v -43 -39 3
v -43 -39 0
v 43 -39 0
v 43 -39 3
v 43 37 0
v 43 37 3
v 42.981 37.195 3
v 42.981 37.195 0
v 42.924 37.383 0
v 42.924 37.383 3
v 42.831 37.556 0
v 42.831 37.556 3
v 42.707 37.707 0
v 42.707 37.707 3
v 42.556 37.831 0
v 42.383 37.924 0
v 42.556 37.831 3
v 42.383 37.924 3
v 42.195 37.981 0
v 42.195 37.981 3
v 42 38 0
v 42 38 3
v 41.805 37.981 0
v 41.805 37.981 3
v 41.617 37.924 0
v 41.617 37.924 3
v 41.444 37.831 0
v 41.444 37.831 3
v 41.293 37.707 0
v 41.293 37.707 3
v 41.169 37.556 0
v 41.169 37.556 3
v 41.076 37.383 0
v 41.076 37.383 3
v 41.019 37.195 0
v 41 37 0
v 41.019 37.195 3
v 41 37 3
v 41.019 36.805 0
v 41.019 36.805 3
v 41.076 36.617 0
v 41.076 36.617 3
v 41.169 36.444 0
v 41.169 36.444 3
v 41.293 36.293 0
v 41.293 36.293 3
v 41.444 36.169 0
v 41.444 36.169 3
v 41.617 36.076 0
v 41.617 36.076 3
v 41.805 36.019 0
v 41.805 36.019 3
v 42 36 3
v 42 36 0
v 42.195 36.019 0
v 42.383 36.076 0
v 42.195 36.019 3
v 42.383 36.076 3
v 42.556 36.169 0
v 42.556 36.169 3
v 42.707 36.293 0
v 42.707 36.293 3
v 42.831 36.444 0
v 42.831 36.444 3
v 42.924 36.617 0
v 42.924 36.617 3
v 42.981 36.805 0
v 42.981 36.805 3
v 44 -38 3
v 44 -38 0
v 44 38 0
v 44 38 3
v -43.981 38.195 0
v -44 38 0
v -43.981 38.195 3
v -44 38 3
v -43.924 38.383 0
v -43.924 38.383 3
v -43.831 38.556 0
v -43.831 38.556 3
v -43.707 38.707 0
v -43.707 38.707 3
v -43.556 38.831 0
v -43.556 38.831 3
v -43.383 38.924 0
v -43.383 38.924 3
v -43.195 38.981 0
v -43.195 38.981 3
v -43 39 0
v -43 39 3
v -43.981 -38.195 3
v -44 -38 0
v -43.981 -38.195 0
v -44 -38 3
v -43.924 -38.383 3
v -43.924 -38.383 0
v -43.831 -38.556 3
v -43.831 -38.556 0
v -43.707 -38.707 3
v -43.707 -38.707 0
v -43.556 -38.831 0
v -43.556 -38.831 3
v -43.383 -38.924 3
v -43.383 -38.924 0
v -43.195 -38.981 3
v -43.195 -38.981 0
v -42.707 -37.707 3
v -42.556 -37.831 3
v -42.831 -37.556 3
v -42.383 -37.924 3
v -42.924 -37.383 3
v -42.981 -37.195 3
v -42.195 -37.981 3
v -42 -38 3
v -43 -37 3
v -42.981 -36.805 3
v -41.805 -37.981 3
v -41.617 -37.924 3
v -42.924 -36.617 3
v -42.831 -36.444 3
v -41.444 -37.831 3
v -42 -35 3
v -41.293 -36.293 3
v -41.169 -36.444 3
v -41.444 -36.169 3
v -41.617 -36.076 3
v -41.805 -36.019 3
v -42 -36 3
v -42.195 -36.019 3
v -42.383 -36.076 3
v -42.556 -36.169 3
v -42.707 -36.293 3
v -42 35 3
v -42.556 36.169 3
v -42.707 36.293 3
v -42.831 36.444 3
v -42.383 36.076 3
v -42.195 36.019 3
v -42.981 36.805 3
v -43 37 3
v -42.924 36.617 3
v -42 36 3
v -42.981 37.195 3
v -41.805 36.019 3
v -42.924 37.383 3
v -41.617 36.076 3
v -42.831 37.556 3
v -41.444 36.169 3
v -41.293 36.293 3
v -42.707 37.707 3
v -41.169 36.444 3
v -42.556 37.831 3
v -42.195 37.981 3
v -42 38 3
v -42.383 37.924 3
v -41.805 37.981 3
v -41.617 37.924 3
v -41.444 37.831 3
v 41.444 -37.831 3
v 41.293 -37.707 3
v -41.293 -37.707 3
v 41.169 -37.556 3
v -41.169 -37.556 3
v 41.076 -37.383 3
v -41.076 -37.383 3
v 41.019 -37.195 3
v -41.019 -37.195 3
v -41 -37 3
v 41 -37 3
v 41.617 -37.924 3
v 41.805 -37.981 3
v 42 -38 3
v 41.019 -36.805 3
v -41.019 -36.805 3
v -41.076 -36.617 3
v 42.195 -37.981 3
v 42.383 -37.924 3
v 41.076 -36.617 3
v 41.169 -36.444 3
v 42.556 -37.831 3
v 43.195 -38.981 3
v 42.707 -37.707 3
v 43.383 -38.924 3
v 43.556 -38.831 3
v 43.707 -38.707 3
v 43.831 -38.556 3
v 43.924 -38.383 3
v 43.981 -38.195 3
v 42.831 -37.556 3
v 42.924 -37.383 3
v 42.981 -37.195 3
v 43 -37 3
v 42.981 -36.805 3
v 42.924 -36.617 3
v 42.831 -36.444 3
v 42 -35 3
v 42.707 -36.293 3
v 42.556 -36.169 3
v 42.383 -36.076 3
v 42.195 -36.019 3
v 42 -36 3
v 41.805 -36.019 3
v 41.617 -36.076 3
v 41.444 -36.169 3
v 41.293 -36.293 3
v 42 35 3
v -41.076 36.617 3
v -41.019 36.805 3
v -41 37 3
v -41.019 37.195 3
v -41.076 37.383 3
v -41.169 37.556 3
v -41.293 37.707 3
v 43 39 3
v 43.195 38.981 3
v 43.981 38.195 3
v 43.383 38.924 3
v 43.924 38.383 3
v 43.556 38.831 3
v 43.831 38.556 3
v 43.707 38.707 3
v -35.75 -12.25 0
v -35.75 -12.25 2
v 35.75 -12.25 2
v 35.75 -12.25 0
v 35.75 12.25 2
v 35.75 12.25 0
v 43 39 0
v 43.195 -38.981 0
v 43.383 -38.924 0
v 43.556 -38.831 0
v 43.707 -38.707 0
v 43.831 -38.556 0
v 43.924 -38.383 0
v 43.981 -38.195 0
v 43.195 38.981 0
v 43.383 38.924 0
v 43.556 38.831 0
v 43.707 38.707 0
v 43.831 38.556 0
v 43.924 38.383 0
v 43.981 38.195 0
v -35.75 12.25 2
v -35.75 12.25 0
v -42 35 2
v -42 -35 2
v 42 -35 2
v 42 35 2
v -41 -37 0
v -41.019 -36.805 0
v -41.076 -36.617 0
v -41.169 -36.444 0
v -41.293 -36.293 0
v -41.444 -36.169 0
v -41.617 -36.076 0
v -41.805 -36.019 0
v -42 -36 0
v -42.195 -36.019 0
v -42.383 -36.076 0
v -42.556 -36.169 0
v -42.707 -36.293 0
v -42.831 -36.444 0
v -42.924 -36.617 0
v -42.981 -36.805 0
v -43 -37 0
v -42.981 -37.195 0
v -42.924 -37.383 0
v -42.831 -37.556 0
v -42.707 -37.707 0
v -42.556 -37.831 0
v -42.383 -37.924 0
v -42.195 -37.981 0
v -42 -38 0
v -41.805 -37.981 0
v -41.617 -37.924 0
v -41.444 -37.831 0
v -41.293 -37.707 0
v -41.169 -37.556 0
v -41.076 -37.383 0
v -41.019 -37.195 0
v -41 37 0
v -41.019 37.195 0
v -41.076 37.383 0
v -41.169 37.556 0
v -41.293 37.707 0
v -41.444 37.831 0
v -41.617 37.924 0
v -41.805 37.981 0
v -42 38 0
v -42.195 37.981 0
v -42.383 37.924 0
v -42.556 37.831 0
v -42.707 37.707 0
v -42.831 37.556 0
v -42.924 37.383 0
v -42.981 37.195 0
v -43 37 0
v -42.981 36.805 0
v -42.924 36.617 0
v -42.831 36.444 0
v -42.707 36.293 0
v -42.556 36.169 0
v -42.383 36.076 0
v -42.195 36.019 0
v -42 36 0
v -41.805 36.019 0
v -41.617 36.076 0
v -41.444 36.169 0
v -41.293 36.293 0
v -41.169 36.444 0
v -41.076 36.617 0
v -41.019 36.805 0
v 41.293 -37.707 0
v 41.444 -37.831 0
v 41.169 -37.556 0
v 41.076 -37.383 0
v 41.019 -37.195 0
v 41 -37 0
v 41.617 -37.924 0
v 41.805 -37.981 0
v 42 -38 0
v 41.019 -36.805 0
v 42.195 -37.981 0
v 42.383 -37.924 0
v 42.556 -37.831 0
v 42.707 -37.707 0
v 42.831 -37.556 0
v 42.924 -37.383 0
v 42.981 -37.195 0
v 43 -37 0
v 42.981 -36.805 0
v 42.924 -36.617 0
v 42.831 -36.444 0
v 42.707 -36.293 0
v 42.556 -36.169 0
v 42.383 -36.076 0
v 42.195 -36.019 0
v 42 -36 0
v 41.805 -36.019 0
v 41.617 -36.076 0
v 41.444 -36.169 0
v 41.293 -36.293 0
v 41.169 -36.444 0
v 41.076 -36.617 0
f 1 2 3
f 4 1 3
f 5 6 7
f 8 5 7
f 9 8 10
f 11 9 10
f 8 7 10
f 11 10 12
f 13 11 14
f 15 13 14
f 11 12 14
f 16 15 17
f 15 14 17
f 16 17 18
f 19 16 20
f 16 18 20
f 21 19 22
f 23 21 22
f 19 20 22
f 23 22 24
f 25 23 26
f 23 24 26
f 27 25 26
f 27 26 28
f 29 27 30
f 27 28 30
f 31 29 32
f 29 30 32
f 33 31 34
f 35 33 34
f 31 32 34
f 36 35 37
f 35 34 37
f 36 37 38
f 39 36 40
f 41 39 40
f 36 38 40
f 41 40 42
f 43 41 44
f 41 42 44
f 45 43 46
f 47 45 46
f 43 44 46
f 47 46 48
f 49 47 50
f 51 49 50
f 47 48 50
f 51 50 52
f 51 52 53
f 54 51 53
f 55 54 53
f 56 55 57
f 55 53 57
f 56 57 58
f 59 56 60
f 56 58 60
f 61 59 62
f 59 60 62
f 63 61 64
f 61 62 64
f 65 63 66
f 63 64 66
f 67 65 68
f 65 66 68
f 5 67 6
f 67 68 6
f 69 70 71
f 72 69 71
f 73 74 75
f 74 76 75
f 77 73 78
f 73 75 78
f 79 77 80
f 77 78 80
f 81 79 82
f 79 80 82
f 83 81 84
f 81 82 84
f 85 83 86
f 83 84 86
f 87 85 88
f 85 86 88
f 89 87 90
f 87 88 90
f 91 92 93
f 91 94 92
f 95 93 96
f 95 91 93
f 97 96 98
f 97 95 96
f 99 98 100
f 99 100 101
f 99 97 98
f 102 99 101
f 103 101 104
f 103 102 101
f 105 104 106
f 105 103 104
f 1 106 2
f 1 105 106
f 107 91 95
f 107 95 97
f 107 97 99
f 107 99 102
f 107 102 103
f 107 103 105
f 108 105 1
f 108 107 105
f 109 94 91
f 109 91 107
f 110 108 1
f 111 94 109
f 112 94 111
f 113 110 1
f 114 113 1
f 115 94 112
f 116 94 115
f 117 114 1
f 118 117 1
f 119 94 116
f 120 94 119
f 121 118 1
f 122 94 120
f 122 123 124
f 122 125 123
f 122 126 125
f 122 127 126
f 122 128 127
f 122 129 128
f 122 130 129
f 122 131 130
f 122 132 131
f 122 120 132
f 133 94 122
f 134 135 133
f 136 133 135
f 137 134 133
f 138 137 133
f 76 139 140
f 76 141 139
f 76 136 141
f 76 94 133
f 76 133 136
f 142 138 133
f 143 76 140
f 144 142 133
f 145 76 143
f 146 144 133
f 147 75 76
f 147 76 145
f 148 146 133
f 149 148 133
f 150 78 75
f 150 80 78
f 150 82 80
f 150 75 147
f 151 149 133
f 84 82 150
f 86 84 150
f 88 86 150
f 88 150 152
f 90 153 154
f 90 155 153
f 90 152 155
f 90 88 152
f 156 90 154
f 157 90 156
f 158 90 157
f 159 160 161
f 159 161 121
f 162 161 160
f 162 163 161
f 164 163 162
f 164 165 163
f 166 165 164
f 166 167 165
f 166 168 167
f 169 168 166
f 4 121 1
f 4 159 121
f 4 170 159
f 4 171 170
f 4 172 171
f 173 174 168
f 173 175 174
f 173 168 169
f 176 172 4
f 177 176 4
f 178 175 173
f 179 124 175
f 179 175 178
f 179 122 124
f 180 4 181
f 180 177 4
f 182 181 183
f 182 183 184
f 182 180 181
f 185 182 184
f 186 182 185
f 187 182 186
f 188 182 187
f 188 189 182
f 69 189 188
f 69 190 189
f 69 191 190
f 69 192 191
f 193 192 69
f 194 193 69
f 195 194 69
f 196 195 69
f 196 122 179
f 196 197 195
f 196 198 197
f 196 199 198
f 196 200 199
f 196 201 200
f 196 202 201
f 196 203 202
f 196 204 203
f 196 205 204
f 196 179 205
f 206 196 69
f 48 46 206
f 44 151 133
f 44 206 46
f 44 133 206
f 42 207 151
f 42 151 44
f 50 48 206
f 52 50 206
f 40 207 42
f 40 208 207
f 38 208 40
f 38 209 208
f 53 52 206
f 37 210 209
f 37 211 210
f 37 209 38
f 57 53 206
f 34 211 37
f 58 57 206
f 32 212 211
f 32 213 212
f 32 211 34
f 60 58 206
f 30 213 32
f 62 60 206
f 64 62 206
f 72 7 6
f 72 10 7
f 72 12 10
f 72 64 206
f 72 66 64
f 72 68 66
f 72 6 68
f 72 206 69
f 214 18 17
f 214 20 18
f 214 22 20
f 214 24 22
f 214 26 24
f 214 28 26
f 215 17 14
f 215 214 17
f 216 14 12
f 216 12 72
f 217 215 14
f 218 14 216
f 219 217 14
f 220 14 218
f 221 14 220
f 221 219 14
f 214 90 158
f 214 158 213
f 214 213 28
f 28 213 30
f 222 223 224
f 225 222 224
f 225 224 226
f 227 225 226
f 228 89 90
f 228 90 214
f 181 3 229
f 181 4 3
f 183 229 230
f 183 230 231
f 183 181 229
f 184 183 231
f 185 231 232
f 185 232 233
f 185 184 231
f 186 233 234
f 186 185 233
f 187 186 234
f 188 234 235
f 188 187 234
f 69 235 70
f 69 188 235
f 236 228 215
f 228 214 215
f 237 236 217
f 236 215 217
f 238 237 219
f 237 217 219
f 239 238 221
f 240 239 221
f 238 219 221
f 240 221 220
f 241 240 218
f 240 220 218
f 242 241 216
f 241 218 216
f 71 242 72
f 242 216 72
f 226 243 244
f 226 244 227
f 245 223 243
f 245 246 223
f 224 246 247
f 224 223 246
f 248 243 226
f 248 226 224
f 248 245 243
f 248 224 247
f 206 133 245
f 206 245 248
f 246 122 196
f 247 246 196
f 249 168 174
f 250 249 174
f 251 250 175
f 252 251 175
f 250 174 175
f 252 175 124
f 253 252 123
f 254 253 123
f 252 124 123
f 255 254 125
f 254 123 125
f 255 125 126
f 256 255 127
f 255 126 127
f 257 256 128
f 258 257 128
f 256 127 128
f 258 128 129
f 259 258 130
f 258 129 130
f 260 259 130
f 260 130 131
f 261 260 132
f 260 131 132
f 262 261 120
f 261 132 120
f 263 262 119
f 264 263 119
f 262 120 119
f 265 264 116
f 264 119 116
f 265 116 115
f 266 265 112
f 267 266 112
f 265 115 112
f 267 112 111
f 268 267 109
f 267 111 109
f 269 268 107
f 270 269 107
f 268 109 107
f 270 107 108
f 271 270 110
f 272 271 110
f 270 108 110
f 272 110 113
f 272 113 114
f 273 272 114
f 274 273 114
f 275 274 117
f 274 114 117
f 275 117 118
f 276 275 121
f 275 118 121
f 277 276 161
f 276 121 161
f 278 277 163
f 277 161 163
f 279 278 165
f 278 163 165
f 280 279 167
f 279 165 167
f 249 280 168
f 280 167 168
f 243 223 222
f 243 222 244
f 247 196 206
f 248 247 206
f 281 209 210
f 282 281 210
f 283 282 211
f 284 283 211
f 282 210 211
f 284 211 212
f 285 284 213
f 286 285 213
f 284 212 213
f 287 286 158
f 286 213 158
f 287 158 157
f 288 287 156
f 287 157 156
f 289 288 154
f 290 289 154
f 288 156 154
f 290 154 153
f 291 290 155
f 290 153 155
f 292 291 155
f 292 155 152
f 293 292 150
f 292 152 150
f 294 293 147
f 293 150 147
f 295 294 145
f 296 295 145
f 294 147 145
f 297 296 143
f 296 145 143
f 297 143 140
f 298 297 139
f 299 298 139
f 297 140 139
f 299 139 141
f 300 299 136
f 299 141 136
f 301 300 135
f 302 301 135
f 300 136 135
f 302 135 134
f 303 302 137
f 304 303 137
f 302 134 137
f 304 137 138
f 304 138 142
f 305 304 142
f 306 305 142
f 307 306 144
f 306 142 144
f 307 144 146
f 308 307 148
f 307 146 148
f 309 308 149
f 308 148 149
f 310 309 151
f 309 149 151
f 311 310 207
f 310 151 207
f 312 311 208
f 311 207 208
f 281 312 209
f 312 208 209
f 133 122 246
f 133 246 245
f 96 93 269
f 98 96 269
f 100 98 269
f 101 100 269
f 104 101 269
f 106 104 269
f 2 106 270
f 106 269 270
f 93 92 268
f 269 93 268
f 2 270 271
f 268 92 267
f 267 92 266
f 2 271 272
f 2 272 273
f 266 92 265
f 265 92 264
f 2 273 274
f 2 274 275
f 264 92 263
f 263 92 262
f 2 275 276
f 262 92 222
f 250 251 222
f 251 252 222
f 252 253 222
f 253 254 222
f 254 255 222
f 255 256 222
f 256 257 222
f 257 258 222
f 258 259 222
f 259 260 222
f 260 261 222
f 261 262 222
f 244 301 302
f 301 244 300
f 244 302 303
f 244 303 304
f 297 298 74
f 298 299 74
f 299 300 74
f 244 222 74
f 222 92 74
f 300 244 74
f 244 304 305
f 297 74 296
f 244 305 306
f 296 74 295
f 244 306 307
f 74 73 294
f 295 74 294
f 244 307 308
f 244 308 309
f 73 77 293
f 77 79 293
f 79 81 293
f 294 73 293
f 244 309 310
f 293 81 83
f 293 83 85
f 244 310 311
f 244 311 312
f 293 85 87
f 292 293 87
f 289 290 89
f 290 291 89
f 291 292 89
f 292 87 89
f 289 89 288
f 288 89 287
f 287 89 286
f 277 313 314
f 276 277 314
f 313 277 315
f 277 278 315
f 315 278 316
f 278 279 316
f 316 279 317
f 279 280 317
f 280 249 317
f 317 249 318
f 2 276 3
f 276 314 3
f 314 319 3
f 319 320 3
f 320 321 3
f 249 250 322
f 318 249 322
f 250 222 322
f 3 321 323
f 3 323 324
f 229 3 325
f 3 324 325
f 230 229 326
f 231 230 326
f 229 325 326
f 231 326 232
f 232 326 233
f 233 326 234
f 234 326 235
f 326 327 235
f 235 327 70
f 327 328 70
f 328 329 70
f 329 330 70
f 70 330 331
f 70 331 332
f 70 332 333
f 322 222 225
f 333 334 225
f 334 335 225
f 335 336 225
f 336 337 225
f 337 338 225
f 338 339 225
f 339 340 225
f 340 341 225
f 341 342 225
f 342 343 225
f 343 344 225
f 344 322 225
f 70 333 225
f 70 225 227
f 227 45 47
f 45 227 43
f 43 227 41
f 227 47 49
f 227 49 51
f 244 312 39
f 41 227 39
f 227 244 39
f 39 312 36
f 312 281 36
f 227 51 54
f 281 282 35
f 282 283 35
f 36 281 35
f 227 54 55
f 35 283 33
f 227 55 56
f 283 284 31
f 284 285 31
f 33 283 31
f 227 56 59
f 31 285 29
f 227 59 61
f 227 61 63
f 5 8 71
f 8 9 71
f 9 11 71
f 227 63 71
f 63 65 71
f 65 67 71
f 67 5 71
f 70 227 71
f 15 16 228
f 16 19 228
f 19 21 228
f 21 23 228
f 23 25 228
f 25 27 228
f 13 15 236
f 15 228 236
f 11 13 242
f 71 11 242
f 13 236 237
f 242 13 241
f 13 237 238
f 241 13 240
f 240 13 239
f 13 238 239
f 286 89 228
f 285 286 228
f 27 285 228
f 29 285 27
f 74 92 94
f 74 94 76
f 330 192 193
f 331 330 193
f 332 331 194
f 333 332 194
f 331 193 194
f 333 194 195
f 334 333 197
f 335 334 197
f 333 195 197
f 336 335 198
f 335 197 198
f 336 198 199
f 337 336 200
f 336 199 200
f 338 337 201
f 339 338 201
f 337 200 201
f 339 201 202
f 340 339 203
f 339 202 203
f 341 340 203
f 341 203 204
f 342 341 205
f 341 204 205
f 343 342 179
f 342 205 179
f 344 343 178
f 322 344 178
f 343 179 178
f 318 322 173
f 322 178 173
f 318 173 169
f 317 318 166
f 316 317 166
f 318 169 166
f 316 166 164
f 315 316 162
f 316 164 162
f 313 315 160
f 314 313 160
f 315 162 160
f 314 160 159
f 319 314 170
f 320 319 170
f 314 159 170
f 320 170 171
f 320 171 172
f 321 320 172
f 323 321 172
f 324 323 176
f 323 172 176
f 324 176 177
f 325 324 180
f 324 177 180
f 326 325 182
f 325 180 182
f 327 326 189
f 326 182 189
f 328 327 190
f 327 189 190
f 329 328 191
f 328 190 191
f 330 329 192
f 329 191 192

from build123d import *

# Parameters (mm, degrees)
SKETCH2_W           = 88
SKETCH2_H           = 78
BOSS_EXTRUDE1_DEPTH = 3
SKETCH3_W           = 84
SKETCH3_H           = 70
CUT_EXTRUDE1_DEPTH  = 1
SKETCH4_R           = 1
CUT_EXTRUDE2_DEPTH  = 3
FILLET1_R           = 1
SKETCH5_W           = 71.5
SKETCH5_H           = 24.5
CUT_EXTRUDE3_DEPTH  = 3


with BuildPart() as part:
    # Sketch2 → Boss-Extrude1 (new body)
    with BuildSketch(Plane.XY):
        Rectangle(SKETCH2_W, SKETCH2_H)
    extrude(amount=BOSS_EXTRUDE1_DEPTH)

    # Sketch3 → Cut-Extrude1 (cut)
    with BuildSketch(Plane.XY.offset(3)):
        Rectangle(SKETCH3_W, SKETCH3_H)
    extrude(amount=-CUT_EXTRUDE1_DEPTH, mode=Mode.SUBTRACT)

    # Sketch4 → Cut-Extrude2 (cut)
    with BuildSketch(Plane.XY.offset(3)):
        with Locations((-42, 37)):
            Circle(SKETCH4_R)
        with Locations((42, 37)):
            Circle(SKETCH4_R)
        with Locations((-42, -37)):
            Circle(SKETCH4_R)
        with Locations((42, -37)):
            Circle(SKETCH4_R)
    extrude(amount=-CUT_EXTRUDE2_DEPTH, mode=Mode.SUBTRACT)

    # Fillet1
    fillet1_edges = [part.edges().sort_by_distance(p)[0] for p in [
        (-44, -39, 1.5),
        (-44, 39, 1.5),
        (44, 39, 1.5),
        (44, -39, 1.5),
    ]]
    fillet(fillet1_edges, radius=FILLET1_R)

    # Sketch5 → Cut-Extrude3 (cut)
    with BuildSketch(Plane.XY.offset(2)):
        Rectangle(SKETCH5_W, SKETCH5_H)
    extrude(amount=-CUT_EXTRUDE3_DEPTH, mode=Mode.SUBTRACT)


solid = part.part
